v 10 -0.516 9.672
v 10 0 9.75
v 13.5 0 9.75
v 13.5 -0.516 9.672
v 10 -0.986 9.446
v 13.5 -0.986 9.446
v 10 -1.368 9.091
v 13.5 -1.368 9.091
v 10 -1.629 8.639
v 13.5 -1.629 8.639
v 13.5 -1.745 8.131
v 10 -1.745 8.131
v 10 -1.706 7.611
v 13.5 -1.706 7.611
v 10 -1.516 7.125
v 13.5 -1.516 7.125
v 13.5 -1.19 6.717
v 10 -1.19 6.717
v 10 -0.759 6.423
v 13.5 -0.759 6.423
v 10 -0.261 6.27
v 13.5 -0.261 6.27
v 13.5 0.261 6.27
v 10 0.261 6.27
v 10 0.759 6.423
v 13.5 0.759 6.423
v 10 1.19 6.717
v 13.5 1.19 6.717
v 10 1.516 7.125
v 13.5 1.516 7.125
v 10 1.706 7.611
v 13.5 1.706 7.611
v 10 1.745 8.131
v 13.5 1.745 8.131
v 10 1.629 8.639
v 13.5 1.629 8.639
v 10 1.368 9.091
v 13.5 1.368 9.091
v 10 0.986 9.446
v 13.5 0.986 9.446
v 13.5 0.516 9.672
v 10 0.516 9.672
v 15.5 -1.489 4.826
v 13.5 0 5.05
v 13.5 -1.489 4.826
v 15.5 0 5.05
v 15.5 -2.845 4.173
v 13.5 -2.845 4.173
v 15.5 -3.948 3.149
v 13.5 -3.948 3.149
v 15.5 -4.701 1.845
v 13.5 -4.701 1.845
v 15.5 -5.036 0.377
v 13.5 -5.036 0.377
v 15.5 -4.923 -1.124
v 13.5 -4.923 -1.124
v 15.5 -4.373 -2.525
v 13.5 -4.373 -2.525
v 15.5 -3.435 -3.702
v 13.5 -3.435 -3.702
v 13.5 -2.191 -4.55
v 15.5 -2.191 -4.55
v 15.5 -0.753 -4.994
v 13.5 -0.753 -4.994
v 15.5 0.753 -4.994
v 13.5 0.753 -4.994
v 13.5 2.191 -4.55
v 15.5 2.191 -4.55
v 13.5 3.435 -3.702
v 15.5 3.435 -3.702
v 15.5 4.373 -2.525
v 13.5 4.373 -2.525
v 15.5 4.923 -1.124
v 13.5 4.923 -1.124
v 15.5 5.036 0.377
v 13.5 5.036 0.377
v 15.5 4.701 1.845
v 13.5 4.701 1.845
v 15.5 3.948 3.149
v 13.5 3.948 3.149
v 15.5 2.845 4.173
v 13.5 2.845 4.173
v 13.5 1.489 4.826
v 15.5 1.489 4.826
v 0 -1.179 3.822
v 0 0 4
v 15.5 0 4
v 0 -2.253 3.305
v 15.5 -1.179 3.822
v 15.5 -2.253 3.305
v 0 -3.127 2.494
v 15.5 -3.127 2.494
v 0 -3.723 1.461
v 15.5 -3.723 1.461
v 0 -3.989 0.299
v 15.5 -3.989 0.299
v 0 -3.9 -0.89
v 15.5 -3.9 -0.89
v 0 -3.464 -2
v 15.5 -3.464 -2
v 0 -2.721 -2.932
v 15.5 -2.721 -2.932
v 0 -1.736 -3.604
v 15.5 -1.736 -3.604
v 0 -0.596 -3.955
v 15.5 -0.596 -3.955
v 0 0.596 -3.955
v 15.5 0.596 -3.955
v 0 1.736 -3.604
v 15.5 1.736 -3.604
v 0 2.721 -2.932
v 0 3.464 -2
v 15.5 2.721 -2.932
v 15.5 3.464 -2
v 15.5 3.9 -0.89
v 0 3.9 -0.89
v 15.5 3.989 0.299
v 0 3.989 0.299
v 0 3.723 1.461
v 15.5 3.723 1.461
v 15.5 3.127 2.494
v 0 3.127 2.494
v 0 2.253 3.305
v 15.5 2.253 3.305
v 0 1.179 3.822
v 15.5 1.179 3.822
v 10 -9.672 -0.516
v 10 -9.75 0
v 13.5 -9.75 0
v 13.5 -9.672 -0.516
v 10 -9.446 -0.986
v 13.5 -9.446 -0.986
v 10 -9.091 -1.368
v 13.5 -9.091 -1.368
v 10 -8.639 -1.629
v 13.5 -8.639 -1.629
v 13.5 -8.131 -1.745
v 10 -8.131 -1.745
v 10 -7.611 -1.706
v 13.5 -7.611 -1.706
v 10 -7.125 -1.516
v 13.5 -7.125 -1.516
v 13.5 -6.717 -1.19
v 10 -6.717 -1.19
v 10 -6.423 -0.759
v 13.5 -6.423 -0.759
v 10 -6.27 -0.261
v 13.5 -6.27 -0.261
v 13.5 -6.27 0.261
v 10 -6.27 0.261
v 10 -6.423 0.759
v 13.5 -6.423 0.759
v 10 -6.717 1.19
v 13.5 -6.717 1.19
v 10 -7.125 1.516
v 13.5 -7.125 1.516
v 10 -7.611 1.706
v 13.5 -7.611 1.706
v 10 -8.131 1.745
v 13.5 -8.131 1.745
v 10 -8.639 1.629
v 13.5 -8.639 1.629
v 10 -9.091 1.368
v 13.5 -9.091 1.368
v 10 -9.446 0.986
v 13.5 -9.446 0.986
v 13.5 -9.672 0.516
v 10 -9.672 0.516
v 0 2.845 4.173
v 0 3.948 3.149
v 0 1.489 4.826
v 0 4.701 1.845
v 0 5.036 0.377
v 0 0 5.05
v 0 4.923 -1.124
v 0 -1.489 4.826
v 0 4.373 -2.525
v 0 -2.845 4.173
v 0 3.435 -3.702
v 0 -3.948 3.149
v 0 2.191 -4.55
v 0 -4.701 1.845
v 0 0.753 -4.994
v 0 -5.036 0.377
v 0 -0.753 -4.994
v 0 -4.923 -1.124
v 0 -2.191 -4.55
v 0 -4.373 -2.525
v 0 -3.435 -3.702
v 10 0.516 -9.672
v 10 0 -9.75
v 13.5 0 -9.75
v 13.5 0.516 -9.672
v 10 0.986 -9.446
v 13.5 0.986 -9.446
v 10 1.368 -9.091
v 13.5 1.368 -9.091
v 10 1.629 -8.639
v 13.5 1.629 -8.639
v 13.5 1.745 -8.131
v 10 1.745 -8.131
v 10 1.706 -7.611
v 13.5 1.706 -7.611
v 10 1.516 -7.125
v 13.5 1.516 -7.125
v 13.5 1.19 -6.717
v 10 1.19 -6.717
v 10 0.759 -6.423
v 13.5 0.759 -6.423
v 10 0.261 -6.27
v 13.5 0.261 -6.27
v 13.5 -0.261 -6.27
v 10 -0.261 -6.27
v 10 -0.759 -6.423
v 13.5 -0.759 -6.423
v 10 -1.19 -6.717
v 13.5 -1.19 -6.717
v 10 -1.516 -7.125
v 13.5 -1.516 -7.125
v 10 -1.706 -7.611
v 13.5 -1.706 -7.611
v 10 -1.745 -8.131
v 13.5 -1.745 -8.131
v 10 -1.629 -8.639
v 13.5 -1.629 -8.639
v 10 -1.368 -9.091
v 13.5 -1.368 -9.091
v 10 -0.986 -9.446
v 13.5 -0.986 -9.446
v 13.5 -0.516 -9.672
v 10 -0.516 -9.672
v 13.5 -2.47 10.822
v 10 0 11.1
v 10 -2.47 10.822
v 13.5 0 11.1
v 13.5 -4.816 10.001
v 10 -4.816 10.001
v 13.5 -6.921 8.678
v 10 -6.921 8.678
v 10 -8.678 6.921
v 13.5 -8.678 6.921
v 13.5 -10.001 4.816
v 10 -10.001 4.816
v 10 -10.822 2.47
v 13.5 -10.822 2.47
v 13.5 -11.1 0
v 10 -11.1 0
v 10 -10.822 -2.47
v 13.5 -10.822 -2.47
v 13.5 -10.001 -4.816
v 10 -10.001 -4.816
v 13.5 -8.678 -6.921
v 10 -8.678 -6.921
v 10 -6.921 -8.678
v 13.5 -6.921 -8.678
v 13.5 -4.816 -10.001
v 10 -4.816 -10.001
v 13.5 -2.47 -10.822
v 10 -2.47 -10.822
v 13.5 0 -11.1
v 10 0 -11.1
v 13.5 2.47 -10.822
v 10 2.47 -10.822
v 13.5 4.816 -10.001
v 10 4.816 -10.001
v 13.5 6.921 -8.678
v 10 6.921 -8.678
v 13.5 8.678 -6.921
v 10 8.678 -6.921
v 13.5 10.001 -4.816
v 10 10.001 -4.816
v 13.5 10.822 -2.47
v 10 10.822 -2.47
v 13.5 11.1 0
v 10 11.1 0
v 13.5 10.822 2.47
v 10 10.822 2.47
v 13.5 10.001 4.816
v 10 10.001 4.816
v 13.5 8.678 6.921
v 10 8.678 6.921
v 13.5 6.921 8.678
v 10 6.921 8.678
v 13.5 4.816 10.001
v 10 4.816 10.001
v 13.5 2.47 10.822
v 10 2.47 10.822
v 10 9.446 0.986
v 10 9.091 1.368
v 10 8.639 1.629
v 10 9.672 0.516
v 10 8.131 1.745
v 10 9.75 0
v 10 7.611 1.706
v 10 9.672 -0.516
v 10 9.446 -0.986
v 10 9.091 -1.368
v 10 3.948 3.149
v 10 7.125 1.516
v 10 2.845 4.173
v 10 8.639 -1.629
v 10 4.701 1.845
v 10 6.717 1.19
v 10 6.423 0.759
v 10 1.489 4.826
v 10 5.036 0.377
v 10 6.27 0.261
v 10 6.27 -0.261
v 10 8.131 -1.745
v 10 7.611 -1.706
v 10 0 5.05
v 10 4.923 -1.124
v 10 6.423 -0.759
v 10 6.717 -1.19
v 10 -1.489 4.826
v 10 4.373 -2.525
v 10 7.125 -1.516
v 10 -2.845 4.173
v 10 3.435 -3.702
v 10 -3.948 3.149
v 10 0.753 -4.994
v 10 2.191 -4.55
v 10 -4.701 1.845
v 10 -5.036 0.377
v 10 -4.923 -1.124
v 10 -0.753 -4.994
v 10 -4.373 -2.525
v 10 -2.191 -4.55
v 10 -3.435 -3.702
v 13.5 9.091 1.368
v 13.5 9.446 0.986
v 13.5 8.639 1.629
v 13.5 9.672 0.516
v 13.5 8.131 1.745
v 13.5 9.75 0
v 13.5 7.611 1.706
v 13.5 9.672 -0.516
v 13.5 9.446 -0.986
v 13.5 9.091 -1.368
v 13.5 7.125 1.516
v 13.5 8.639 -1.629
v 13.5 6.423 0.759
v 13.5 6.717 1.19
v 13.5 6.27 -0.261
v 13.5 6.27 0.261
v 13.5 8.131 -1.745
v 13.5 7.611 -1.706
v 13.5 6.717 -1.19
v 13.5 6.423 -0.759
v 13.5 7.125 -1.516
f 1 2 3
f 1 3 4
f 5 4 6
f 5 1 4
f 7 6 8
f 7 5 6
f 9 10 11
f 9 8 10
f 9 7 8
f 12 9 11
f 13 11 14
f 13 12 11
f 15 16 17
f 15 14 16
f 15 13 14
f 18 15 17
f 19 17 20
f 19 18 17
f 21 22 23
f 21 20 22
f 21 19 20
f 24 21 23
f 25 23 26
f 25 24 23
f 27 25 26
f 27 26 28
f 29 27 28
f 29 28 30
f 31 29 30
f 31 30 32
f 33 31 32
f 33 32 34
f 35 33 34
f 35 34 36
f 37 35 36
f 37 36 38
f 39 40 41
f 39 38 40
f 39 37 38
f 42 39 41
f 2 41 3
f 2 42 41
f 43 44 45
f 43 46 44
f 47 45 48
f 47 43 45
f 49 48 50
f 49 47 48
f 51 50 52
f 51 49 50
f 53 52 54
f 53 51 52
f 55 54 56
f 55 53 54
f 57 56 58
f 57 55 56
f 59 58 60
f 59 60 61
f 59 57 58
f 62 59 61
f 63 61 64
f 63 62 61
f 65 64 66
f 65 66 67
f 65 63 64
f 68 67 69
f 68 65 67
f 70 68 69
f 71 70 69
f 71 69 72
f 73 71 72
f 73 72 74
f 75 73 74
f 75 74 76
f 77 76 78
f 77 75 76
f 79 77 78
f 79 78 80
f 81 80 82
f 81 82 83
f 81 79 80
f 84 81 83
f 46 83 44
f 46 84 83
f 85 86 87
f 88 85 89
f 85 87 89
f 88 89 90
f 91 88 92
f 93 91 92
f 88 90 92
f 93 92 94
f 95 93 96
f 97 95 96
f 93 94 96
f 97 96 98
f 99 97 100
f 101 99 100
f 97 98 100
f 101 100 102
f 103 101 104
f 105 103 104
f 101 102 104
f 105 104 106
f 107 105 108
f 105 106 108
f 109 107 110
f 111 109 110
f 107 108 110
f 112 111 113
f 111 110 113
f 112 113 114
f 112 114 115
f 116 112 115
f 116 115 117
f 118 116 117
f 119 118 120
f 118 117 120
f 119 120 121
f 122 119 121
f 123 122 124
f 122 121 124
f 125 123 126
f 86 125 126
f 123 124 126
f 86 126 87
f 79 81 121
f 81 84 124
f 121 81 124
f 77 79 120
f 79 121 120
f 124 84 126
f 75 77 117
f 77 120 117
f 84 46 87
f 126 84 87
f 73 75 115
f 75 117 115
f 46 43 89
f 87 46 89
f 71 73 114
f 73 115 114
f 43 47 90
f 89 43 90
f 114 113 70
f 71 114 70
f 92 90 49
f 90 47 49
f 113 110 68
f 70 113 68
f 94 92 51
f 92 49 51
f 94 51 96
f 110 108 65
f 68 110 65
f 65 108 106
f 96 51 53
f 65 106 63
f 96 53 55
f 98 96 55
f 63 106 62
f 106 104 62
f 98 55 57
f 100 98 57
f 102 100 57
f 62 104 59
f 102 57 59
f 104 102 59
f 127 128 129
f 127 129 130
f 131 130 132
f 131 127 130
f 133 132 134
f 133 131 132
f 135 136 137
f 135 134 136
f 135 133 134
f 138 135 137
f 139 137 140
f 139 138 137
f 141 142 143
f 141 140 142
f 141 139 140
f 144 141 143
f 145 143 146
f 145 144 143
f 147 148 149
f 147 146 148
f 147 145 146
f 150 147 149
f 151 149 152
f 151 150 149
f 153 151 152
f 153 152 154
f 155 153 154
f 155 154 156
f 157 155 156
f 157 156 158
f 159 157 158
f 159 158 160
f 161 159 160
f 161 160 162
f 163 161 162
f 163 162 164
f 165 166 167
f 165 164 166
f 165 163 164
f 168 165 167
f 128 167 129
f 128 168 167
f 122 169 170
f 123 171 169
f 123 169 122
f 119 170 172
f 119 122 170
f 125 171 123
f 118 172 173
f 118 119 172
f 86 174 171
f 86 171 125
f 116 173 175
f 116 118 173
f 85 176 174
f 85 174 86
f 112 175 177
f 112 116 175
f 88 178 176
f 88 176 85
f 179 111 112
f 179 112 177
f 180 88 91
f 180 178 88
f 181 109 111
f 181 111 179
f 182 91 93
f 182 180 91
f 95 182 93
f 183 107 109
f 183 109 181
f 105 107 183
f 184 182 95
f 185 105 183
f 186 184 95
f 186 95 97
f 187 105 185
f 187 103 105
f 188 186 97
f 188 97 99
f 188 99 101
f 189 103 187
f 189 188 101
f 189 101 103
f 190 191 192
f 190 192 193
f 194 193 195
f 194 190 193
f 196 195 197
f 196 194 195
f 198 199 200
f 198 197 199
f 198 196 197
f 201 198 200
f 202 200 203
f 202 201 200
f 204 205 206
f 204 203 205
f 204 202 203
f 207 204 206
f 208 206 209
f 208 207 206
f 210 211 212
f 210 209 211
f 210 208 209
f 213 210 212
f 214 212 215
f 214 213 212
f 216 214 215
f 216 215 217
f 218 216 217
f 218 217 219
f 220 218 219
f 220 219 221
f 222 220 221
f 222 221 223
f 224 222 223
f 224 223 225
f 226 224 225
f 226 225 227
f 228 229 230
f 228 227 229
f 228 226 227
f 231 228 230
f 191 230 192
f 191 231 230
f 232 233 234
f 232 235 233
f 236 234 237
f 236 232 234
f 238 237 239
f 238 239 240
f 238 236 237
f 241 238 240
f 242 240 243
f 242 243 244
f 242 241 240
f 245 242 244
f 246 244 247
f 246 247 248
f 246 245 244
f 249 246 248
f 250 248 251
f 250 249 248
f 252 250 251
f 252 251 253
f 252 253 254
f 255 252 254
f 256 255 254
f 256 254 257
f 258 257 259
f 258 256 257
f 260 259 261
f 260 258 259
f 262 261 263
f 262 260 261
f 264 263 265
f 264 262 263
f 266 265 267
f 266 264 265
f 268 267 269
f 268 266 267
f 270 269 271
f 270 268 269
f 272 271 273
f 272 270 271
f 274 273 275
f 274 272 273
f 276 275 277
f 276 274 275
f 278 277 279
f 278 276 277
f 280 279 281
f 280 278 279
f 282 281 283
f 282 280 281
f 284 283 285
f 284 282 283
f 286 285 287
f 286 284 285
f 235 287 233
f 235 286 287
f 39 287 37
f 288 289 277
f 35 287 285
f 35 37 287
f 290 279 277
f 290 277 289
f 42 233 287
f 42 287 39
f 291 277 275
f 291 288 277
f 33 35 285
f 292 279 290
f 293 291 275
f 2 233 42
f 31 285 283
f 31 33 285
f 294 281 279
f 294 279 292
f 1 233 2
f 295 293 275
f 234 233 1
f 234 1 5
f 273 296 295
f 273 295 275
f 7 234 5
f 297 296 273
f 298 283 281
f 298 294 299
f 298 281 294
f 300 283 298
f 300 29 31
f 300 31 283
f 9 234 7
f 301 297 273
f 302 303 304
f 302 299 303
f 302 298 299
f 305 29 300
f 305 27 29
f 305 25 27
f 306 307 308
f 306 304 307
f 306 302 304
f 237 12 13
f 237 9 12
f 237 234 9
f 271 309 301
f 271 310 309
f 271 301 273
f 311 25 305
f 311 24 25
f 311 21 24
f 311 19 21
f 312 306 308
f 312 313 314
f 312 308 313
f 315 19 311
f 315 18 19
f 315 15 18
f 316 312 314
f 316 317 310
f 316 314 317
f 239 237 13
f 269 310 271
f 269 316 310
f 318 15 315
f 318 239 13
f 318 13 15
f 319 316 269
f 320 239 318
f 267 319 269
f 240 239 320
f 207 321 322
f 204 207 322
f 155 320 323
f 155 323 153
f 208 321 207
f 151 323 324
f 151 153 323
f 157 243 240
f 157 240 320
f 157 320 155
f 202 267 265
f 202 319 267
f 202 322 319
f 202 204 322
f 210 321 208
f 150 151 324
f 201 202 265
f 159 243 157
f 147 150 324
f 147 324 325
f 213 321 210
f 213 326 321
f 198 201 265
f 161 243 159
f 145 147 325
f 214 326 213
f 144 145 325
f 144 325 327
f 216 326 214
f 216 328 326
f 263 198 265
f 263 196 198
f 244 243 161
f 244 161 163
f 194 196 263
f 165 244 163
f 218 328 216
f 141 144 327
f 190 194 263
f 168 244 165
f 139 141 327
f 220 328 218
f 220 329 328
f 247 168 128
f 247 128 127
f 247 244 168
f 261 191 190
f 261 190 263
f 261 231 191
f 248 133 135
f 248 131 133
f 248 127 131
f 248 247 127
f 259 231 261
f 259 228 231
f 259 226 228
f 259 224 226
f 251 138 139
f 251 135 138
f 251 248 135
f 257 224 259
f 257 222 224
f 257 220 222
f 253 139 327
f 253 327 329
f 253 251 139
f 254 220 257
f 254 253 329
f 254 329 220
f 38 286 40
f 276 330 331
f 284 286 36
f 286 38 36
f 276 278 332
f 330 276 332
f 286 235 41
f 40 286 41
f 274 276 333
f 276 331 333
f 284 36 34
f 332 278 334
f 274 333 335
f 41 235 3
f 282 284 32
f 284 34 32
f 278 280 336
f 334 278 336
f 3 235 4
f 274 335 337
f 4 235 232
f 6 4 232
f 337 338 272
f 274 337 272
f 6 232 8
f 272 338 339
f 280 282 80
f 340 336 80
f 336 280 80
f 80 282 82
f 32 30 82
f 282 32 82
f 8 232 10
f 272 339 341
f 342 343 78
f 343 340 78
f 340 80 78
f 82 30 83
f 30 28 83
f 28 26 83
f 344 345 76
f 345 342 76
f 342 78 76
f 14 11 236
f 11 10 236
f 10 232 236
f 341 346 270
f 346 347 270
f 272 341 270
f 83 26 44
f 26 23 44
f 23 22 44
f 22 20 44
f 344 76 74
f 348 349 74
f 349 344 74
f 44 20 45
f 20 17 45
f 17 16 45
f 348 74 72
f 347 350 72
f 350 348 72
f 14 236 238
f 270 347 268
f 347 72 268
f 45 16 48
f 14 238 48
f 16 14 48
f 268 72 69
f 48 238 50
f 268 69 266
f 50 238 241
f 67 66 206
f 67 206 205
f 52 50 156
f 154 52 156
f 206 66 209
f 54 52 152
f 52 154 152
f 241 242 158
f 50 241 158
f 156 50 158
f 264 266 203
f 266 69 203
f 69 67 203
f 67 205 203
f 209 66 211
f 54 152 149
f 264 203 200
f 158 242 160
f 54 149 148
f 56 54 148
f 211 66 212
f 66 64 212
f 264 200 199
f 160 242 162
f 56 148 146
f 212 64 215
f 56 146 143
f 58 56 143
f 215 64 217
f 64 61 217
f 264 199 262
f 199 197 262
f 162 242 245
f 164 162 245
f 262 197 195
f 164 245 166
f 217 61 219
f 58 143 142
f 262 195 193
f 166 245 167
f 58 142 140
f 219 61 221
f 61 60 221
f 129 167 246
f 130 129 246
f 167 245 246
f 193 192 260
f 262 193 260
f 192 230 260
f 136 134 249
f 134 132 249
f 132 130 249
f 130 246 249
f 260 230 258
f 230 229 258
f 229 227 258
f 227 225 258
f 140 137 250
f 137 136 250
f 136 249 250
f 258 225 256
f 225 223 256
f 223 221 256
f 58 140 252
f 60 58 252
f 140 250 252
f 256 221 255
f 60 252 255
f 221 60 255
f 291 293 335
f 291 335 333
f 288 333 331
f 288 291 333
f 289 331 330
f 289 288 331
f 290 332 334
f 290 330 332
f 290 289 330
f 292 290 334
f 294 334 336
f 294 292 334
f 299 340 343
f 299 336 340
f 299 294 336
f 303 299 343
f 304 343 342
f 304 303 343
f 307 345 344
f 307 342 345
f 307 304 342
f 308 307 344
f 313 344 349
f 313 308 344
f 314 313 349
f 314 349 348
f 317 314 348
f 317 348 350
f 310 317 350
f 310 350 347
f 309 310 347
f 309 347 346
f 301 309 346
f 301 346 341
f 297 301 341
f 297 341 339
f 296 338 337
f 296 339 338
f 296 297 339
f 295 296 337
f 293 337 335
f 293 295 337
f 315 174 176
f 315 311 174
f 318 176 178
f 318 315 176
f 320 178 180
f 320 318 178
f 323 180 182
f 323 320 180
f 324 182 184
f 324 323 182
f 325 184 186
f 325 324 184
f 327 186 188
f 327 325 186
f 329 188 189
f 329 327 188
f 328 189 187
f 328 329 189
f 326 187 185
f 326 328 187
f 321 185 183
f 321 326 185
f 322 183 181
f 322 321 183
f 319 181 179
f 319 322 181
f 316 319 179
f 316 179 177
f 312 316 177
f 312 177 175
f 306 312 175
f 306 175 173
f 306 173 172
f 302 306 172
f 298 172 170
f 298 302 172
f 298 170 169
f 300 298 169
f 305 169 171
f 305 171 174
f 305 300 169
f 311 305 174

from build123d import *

# Parameters (mm, degrees)
SKETCH1_W          = 3.5
SKETCH1_H          = 6.05
SKETCH1_W_2        = 15.5
SKETCH1_H_2        = 1.05
SKETCH2_R          = 1.75
CUT_EXTRUDE1_DEPTH = 23.06059836
CIRPATTERN1_COUNT  = 4


with BuildPart() as part:
    # Sketch1 → Revolve1 (revolve)
    with BuildSketch(Plane.XY, mode=Mode.PRIVATE) as revolve1_sk:
        with Locations((11.75, 8.075)):
            Rectangle(SKETCH1_W, SKETCH1_H)
        with Locations((7.75, 4.525)):
            Rectangle(SKETCH1_W_2, SKETCH1_H_2)
    revolve(revolve1_sk.sketch.rotate(Axis((0, 0, 0), (1, 0, 0)), 90), axis=Axis((0, 0, 0), (1, 0, 0)))

    # Sketch2 → Cut-Extrude1 (cut, through all)
    with BuildSketch(Plane(origin=(0, 0, 0), x_dir=(0, 0, -1), z_dir=(1, 0, 0))):
        with Locations((8, 0)):
            Circle(SKETCH2_R)
    cut_extrude1 = extrude(amount=CUT_EXTRUDE1_DEPTH, mode=Mode.SUBTRACT)

    # CirPattern1: Cut-Extrude1 ×4 about axis
    cirpattern1_axis = Axis((0, 0, 0), (1, 0, 0))
    for i in range(1, CIRPATTERN1_COUNT):
        add(cut_extrude1.rotate(cirpattern1_axis, i * 360 / CIRPATTERN1_COUNT), mode=Mode.SUBTRACT)


solid = part.part
